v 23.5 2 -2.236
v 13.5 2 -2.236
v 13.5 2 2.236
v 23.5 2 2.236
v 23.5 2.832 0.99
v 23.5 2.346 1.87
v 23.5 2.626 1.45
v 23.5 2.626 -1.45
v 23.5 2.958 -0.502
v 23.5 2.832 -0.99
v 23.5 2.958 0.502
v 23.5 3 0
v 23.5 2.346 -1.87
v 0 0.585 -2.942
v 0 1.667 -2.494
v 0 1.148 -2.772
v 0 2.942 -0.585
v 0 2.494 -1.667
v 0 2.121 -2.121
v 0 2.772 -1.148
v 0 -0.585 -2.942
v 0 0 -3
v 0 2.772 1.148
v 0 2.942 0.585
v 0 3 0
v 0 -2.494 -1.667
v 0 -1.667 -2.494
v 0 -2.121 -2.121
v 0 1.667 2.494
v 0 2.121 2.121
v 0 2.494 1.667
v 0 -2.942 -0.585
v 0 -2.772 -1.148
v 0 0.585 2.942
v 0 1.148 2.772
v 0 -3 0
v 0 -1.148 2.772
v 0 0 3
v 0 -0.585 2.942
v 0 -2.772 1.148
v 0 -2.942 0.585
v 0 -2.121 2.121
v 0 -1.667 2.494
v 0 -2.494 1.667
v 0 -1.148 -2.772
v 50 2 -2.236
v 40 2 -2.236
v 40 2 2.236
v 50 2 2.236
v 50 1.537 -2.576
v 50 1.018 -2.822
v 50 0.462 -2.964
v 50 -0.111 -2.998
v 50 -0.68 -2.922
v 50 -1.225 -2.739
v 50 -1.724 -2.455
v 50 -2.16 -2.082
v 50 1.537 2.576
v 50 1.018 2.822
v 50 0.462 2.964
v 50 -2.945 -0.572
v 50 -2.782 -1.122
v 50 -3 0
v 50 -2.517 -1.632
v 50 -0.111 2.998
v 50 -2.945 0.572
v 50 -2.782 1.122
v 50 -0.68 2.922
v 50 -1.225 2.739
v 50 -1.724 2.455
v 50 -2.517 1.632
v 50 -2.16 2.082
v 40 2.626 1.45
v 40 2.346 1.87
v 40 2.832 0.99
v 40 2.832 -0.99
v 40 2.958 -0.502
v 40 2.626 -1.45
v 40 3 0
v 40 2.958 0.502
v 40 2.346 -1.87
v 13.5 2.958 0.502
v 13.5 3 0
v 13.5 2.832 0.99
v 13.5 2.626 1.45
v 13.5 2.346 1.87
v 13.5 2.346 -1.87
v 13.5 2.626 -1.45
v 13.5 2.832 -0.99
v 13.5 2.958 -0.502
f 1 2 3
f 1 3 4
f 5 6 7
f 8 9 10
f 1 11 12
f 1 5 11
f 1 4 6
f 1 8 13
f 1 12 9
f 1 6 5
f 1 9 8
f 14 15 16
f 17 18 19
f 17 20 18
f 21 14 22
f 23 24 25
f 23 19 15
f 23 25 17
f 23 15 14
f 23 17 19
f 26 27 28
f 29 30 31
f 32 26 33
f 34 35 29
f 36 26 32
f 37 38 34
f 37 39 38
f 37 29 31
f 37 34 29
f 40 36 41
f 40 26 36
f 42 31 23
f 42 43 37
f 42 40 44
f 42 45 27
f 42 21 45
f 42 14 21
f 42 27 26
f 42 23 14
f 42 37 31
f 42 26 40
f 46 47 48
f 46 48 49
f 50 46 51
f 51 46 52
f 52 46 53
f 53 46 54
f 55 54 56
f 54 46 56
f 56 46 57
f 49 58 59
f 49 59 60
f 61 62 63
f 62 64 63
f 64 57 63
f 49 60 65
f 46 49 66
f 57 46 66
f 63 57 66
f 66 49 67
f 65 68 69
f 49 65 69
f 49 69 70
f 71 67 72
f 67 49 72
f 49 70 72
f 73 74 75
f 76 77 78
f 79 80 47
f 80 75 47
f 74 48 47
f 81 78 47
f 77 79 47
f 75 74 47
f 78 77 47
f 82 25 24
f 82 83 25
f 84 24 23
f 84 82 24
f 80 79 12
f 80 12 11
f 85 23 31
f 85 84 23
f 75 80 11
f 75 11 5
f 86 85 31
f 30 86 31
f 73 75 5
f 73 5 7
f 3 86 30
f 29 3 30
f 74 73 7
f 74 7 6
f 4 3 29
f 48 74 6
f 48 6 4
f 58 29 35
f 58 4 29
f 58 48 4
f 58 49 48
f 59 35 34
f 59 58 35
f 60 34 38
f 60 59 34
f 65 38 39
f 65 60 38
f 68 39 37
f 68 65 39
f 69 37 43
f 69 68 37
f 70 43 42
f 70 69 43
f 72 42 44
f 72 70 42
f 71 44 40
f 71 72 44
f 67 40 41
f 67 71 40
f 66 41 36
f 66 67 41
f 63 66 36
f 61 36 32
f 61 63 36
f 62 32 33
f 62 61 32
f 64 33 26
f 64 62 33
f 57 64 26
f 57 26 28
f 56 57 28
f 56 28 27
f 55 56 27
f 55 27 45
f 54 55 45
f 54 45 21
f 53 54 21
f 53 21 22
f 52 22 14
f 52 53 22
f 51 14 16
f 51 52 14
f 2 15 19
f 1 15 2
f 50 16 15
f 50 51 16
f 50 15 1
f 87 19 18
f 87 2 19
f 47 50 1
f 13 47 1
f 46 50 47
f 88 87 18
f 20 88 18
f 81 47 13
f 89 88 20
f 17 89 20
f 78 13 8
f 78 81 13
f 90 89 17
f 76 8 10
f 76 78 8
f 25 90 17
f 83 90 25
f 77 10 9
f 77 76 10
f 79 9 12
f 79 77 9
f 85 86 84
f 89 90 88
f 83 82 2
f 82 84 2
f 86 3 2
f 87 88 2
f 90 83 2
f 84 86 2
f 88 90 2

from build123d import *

# Parameters (mm, degrees)
SKIZZE1_W                            = 50
SKIZZE1_H                            = 3
SKIZZE2_W                            = 10
SKIZZE2_H                            = 2
SCHNITT_LINEAR_AUSTRAGEN1_DEPTH      = 4
SCHNITT_LINEAR_AUSTRAGEN1_DEPTH_BACK = 4


with BuildPart() as part:
    # Skizze1 → Rotation1 (revolve)
    with BuildSketch(Plane.XY):
        with Locations((25, 1.5)):
            Rectangle(SKIZZE1_W, SKIZZE1_H)
    revolve(axis=Axis((0, 0, 0), (1, 0, 0)))

    # Skizze2 → Schnitt-Linear austragen1 (cut, two sides)
    with BuildSketch(Plane.XY) as schnitt_linear_austragen1_sk:
        with Locations((18.5, 3)):
            Rectangle(SKIZZE2_W, SKIZZE2_H)
        with Locations((45, 3)):
            Rectangle(SKIZZE2_W, SKIZZE2_H)
    extrude(amount=SCHNITT_LINEAR_AUSTRAGEN1_DEPTH, mode=Mode.SUBTRACT)
    extrude(schnitt_linear_austragen1_sk.sketch, amount=-SCHNITT_LINEAR_AUSTRAGEN1_DEPTH_BACK, mode=Mode.SUBTRACT)


solid = part.part
